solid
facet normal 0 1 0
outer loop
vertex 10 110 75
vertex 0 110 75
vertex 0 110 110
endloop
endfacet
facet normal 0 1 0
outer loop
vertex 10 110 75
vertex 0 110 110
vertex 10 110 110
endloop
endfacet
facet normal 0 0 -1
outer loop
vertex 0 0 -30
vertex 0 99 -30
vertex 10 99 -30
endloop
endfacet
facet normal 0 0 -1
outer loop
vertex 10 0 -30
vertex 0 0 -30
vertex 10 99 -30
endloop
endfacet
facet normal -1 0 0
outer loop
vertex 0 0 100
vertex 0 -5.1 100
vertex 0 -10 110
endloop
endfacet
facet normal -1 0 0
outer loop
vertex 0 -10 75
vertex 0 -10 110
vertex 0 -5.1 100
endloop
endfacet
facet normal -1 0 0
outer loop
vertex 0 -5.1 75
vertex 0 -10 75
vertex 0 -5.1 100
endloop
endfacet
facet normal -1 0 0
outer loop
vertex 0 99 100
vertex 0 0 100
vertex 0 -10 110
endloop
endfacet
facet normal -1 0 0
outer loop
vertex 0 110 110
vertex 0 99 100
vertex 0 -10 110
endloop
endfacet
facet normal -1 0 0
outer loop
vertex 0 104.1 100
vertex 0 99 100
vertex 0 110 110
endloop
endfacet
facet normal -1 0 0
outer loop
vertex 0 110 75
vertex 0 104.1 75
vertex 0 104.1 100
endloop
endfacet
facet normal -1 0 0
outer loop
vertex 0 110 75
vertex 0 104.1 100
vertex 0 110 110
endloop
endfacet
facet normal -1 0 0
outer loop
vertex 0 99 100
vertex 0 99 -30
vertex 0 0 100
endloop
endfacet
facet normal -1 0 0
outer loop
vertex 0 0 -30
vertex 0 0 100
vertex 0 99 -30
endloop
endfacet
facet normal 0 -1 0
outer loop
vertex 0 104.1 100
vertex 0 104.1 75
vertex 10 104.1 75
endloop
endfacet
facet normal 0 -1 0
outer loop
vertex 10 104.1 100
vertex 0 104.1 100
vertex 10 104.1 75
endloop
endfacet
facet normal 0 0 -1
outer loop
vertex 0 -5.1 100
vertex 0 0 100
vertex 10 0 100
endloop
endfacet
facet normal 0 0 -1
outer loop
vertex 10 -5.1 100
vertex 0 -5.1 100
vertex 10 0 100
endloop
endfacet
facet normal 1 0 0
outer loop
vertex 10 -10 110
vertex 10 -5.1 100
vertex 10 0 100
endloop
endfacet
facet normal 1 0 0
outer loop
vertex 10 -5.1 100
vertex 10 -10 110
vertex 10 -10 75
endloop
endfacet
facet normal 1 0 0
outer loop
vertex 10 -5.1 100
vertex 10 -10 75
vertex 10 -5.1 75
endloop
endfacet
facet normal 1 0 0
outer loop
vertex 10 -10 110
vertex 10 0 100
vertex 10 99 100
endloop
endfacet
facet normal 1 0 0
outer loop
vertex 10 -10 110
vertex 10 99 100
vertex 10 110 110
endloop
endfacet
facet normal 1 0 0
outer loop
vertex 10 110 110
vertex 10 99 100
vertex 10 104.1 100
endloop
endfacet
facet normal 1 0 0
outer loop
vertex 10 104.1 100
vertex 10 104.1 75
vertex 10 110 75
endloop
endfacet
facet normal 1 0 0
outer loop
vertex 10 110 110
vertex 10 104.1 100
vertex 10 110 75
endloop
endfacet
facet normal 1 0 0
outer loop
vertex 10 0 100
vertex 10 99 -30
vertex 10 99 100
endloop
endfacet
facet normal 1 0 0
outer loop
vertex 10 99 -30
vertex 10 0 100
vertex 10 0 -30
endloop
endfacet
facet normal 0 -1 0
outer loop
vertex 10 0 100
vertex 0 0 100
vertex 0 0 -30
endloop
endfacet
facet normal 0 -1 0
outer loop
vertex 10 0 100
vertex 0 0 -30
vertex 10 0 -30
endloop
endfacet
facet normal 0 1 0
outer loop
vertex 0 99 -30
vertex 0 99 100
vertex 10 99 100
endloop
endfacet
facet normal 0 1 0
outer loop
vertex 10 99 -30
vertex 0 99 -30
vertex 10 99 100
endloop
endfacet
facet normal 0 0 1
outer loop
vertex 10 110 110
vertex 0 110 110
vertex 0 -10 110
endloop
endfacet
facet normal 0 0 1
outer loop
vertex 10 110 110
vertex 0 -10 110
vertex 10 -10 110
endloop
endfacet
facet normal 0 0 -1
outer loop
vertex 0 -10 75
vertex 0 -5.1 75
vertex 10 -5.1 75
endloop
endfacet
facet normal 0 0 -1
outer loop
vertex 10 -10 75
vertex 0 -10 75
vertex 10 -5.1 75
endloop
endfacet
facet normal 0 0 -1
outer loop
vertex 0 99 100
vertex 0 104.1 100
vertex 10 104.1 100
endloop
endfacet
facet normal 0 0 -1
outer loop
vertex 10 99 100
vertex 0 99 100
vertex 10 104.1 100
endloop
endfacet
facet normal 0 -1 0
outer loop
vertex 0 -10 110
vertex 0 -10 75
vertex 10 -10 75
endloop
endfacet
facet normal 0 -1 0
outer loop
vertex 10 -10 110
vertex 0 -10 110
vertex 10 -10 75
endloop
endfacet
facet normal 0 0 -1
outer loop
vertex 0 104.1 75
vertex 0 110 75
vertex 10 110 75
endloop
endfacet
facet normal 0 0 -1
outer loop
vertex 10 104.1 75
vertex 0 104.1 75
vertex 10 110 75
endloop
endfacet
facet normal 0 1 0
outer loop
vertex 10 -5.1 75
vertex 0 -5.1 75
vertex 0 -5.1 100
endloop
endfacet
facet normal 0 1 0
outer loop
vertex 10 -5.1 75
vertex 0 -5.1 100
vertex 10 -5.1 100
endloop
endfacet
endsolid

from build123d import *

# Parameters (mm, degrees)
BOX003_W     = 10
BOX003_H     = 5.1
BOX003_DEPTH = 25
BOX002_W     = 10
BOX002_H     = 5.1
BOX002_DEPTH = 25
BOX001_W     = 10
BOX001_H     = 120
BOX001_DEPTH = 35
BOX_W        = 10
BOX_H        = 99
BOX_DEPTH    = 140


with BuildPart() as cube003:
    # Box003 → Box003 (new body)
    with BuildSketch(Plane(origin=(0, 99, 75), x_dir=(1, 0, 0), z_dir=(0, 0, 1))):
        with Locations((5, 2.55)):
            Rectangle(BOX003_W, BOX003_H)
    extrude(amount=BOX003_DEPTH)


with BuildPart() as cube002:
    # Box002 → Box002 (new body)
    with BuildSketch(Plane(origin=(0, -5.1, 75), x_dir=(1, 0, 0), z_dir=(0, 0, 1))):
        with Locations((5, 2.55)):
            Rectangle(BOX002_W, BOX002_H)
    extrude(amount=BOX002_DEPTH)


with BuildPart() as cut001:
    # Box001 → Box001 (new body)
    with BuildSketch(Plane(origin=(0, -10, 75), x_dir=(1, 0, 0), z_dir=(0, 0, 1))):
        with Locations((5, 60)):
            Rectangle(BOX001_W, BOX001_H)
    extrude(amount=BOX001_DEPTH)

    # Cut: cut Cube002
    add(cube002.part, mode=Mode.SUBTRACT)

    # Cut001: cut Cube003
    add(cube003.part, mode=Mode.SUBTRACT)


with BuildPart() as fusion:
    # Box → Box (new body)
    with BuildSketch(Plane.XY.offset(-30)):
        with Locations((5, 49.5)):
            Rectangle(BOX_W, BOX_H)
    extrude(amount=BOX_DEPTH)

    # Fusion: union Cut001
    add(cut001.part)


solid = fusion.part
